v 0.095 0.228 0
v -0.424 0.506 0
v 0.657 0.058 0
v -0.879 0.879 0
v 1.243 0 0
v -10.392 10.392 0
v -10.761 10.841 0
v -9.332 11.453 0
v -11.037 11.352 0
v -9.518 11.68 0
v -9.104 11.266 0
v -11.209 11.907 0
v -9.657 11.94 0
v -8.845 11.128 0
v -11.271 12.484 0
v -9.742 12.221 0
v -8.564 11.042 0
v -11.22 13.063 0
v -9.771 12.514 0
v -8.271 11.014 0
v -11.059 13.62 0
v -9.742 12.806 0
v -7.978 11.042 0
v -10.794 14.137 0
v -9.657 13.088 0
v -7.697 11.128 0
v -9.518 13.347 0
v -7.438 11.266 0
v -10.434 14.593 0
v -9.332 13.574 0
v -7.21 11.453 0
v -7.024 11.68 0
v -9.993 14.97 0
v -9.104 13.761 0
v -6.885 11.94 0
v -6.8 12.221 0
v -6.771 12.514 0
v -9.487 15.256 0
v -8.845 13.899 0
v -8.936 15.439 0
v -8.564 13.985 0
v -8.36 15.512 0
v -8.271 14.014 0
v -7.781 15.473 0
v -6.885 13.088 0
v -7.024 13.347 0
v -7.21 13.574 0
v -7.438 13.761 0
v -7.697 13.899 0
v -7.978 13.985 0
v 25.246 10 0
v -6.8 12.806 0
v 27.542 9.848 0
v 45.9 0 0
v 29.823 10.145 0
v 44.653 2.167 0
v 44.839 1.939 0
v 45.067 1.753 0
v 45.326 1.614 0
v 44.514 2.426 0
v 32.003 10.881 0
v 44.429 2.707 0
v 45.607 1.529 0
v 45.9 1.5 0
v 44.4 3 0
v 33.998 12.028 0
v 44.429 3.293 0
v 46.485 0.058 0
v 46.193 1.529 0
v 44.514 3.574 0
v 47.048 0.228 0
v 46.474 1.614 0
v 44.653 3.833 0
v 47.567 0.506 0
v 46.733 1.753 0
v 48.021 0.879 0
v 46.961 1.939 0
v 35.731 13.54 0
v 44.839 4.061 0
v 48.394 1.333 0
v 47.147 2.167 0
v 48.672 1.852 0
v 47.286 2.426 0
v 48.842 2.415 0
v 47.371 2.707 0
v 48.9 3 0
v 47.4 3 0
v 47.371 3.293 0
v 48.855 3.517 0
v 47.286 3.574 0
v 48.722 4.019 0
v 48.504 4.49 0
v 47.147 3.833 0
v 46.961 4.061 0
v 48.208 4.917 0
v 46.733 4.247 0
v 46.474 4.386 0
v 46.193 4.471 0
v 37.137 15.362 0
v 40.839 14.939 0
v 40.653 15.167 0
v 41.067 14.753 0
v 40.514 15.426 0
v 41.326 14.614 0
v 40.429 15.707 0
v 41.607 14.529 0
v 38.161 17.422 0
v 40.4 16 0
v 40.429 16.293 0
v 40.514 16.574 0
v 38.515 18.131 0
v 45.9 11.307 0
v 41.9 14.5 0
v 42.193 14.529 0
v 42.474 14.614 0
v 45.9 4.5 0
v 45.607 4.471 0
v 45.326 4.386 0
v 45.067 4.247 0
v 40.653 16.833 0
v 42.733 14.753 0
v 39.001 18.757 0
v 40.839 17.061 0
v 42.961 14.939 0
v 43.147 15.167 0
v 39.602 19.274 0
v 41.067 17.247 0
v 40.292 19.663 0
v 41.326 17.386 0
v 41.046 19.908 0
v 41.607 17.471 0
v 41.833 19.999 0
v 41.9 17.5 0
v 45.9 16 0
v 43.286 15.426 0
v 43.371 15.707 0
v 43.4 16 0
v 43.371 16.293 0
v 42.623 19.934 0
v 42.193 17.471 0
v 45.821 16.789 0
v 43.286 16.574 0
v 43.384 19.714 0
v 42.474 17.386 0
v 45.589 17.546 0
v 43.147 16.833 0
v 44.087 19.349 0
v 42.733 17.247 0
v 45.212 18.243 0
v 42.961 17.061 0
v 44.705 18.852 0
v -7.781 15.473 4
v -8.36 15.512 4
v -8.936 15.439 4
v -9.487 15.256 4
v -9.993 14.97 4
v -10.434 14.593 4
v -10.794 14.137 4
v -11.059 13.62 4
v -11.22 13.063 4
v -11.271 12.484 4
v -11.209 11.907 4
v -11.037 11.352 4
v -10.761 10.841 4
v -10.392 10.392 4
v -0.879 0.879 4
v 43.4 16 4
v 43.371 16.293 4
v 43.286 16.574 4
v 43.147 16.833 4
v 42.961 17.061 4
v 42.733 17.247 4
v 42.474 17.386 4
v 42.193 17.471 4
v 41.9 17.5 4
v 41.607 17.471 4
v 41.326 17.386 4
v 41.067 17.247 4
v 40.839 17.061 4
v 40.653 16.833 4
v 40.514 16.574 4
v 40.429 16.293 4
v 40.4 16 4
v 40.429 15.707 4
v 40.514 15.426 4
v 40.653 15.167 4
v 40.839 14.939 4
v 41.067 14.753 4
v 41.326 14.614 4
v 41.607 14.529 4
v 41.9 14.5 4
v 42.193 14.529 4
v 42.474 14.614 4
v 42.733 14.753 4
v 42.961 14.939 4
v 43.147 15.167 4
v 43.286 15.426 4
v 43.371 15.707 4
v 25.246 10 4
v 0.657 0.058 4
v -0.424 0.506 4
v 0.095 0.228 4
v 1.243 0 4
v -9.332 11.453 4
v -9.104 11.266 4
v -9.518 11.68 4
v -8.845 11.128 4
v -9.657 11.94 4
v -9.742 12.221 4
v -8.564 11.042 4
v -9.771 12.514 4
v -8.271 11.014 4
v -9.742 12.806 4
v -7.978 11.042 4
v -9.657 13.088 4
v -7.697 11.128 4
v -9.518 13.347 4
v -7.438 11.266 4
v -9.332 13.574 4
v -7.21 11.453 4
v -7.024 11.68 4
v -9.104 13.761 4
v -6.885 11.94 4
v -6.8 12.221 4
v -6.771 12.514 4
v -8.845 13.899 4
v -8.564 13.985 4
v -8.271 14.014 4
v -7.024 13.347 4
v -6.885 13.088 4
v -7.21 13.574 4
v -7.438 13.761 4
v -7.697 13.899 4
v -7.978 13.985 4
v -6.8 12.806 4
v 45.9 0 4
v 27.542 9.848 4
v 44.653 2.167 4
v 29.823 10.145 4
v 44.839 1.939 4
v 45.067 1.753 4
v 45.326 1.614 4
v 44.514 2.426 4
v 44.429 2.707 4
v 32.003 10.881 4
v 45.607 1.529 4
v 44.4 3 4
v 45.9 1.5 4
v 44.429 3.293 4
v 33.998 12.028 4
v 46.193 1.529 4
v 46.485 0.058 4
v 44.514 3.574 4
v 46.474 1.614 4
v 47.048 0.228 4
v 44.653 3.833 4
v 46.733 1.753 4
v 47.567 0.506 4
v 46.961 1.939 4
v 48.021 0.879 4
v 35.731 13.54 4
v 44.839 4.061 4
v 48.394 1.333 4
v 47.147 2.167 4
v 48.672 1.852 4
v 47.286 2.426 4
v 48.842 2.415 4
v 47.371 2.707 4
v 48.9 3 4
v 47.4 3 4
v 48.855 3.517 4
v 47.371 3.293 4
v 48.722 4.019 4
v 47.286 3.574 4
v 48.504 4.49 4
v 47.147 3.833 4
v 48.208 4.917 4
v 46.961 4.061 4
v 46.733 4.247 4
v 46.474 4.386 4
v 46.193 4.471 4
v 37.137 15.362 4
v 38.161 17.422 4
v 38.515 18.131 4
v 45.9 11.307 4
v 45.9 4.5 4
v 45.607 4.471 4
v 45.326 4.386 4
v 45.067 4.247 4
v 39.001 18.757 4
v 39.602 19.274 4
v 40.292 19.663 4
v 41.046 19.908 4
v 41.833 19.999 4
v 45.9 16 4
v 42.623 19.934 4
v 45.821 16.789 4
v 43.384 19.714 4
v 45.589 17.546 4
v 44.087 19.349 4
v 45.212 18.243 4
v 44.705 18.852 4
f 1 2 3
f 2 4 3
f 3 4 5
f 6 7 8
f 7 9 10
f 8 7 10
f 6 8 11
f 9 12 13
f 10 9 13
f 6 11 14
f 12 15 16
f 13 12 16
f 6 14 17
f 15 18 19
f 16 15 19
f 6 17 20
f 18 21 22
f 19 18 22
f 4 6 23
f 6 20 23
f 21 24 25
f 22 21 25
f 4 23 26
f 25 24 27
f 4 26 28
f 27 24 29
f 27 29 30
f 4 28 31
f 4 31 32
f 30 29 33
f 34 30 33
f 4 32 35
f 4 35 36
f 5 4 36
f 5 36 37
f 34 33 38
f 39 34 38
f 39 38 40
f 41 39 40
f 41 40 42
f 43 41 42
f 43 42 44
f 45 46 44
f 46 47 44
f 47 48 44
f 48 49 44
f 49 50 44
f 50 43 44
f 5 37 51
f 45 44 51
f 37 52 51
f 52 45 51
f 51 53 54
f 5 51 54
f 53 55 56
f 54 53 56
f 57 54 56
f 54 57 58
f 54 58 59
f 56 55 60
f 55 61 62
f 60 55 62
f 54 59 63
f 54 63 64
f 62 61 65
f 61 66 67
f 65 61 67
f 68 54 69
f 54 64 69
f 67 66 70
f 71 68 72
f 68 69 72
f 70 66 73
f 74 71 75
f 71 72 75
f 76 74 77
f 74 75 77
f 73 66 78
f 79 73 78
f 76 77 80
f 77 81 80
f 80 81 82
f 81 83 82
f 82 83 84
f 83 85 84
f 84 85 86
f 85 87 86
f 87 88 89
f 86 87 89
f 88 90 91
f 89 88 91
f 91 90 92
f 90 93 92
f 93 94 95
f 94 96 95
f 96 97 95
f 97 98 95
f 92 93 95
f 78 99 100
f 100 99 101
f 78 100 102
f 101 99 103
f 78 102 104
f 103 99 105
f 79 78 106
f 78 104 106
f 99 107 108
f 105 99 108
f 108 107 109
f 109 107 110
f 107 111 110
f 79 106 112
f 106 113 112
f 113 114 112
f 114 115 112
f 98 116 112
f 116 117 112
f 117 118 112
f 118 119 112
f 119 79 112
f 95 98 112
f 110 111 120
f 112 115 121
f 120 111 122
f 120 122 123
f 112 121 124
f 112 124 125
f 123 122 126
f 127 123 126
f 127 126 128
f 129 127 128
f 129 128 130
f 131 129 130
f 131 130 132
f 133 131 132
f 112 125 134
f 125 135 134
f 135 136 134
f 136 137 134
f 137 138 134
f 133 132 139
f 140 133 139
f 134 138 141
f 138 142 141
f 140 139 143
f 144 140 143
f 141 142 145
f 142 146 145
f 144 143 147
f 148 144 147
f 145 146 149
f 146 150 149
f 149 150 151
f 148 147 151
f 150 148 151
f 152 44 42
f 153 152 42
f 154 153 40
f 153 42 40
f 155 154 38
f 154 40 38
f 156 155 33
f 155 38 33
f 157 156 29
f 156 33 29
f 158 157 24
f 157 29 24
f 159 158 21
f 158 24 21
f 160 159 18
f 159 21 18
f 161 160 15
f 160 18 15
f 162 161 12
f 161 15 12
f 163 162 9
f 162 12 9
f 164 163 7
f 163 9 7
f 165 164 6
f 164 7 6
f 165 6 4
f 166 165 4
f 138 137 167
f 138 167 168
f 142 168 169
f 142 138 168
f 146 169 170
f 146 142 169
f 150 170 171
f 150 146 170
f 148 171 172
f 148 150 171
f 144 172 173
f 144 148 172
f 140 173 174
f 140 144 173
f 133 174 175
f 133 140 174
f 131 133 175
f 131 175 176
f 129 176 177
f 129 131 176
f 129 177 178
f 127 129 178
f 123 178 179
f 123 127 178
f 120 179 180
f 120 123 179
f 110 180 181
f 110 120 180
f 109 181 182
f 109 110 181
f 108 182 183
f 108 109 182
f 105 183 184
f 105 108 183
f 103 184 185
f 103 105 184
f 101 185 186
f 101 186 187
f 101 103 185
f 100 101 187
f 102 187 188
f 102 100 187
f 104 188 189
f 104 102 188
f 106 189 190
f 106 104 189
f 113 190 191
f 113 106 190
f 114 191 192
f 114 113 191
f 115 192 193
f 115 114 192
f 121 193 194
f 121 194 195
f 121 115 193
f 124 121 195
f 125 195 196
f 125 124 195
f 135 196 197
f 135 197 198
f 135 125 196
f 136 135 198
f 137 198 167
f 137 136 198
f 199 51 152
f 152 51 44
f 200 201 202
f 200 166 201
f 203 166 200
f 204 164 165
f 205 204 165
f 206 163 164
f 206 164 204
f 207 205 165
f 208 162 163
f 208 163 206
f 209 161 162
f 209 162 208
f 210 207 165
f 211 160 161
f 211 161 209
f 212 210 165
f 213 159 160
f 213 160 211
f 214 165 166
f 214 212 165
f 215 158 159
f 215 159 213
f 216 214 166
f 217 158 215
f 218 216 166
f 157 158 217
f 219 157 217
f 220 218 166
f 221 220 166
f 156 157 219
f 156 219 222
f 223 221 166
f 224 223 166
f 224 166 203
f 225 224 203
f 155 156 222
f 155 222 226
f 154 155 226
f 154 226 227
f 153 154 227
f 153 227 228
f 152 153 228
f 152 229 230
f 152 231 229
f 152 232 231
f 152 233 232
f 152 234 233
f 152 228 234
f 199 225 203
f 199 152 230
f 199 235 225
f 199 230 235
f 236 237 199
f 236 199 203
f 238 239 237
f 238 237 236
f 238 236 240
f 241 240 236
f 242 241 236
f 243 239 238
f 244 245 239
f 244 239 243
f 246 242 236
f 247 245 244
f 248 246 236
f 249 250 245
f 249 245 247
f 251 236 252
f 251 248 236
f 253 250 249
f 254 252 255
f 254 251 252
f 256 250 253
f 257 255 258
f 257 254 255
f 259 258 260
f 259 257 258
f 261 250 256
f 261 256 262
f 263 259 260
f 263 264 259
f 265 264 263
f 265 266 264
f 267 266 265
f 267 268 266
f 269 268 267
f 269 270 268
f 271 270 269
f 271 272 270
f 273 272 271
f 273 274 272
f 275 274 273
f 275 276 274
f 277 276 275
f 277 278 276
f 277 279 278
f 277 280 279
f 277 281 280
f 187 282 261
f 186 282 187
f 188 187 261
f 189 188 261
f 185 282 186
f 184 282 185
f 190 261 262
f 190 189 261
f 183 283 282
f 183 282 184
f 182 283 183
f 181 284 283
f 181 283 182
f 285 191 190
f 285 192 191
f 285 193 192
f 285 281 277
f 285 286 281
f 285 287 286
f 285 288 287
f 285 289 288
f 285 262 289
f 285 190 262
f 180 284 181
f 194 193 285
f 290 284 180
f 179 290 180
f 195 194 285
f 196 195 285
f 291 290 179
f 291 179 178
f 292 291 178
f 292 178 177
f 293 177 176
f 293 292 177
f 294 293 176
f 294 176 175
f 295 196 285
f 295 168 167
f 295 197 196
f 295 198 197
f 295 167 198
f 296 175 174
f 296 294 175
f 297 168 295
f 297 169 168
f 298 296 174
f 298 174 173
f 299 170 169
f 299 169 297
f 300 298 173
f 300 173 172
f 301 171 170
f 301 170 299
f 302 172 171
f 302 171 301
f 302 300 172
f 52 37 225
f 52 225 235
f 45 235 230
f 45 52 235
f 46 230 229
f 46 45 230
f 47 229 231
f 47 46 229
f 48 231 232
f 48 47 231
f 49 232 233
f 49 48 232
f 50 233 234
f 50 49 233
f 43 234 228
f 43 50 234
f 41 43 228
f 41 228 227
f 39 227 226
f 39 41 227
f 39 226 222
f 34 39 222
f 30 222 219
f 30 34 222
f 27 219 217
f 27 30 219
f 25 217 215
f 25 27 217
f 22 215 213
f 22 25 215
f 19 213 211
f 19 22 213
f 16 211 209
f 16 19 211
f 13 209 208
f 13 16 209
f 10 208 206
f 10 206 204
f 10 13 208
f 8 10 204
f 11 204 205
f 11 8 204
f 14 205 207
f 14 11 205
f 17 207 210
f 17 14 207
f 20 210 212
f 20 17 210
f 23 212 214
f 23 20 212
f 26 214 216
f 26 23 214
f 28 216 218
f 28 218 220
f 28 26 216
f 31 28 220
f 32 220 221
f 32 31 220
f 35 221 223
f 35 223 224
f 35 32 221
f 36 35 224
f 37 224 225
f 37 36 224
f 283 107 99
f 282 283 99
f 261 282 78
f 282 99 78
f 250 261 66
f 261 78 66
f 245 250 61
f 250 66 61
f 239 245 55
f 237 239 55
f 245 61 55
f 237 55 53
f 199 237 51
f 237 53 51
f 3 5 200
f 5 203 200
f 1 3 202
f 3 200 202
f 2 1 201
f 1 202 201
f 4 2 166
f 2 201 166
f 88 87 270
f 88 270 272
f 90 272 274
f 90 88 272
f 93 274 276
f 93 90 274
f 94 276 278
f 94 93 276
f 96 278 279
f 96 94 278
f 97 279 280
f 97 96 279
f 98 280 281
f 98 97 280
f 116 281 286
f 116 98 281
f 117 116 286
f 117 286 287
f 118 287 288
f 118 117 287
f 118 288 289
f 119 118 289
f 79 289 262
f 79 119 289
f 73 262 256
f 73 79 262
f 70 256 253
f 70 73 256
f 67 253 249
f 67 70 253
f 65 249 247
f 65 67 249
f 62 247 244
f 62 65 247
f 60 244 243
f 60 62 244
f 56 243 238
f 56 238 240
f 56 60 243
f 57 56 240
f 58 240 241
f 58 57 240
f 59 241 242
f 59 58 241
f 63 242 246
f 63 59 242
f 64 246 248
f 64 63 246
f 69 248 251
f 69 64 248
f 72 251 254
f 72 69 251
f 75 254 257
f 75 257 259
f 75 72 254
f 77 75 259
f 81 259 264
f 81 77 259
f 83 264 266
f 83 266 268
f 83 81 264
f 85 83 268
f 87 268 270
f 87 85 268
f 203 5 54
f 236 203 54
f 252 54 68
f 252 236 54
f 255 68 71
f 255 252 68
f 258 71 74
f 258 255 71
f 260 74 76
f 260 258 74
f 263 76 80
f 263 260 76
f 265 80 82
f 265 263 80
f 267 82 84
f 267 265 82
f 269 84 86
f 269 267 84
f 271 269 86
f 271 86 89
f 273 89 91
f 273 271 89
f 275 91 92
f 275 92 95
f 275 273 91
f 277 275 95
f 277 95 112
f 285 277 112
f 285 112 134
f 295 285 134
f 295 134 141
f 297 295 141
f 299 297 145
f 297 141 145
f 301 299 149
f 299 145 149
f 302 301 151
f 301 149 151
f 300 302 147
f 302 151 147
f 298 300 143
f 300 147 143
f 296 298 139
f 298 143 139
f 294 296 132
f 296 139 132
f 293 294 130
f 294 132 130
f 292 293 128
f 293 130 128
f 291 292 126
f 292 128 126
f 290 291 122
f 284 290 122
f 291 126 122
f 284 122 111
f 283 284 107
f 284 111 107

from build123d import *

# Parameters (mm, degrees)
SKETCH1_R           = 1.5
BOSS_EXTRUDE1_DEPTH = 4
FILLET3_R           = 3
CHAMFER1_DEPTH      = 4


with BuildPart() as part:
    # Sketch1 → Boss-Extrude1 (new body)
    with BuildSketch(Plane.XY):
        with BuildLine():
            Line((0, 0), (48.899957301, 0))
            Line((48.899957301, 0), (48.899957301, 6))
            Line((48.899957301, 6), (45.899957301, 6))
            Line((45.899957301, 6), (45.899957301, 16))
            ThreePointArc((45.899957301, 16), (42.622776894, 19.934149442), (38.161191383, 17.42184015))
            ThreePointArc((38.161191383, 17.42184015), (33.02844755, 11.405508249), (25.246040765, 10))
            Line((25.246040765, 10), (-7.780505141, 15.473258612))
            ThreePointArc((-7.780505141, 15.473258612), (-10.939117439, 13.885145013), (-10.392304845, 10.392304845))
            Line((-10.392304845, 10.392304845), (0, 0))
        make_face()
        with Locations((41.899957301, 16)):
            Circle(SKETCH1_R, mode=Mode.SUBTRACT)
        with Locations((-8.270984502, 12.513625189)):
            Circle(SKETCH1_R, mode=Mode.SUBTRACT)
        with Locations((45.899957301, 3)):
            Circle(SKETCH1_R, mode=Mode.SUBTRACT)
    extrude(amount=BOSS_EXTRUDE1_DEPTH)

    # Fillet3
    fillet3_edges = [part.edges().sort_by_distance(p)[0] for p in [
        (0, 0, 2),
        (48.899957301, 0, 2),
        (48.899957301, 6, 2),
    ]]
    fillet(fillet3_edges, radius=FILLET3_R - 0.0001)  # a hair under: the kernel refuses the full size

    # Chamfer1: read off the stored shape, not the designer's step
    # Chamfer1 outline → Chamfer1 (add)
    with BuildSketch(Plane.XY):
        with BuildLine():
            Line((48.207649608, 4.916913199), (45.899957301, 11.306623863))
            Line((45.899957301, 11.306623863), (45.899957301, 6))
            ThreePointArc((45.899957301, 6), (47.174567124, 5.715763207), (48.207649608, 4.916913199))
        make_face()
    extrude(amount=CHAMFER1_DEPTH)


solid = part.part
